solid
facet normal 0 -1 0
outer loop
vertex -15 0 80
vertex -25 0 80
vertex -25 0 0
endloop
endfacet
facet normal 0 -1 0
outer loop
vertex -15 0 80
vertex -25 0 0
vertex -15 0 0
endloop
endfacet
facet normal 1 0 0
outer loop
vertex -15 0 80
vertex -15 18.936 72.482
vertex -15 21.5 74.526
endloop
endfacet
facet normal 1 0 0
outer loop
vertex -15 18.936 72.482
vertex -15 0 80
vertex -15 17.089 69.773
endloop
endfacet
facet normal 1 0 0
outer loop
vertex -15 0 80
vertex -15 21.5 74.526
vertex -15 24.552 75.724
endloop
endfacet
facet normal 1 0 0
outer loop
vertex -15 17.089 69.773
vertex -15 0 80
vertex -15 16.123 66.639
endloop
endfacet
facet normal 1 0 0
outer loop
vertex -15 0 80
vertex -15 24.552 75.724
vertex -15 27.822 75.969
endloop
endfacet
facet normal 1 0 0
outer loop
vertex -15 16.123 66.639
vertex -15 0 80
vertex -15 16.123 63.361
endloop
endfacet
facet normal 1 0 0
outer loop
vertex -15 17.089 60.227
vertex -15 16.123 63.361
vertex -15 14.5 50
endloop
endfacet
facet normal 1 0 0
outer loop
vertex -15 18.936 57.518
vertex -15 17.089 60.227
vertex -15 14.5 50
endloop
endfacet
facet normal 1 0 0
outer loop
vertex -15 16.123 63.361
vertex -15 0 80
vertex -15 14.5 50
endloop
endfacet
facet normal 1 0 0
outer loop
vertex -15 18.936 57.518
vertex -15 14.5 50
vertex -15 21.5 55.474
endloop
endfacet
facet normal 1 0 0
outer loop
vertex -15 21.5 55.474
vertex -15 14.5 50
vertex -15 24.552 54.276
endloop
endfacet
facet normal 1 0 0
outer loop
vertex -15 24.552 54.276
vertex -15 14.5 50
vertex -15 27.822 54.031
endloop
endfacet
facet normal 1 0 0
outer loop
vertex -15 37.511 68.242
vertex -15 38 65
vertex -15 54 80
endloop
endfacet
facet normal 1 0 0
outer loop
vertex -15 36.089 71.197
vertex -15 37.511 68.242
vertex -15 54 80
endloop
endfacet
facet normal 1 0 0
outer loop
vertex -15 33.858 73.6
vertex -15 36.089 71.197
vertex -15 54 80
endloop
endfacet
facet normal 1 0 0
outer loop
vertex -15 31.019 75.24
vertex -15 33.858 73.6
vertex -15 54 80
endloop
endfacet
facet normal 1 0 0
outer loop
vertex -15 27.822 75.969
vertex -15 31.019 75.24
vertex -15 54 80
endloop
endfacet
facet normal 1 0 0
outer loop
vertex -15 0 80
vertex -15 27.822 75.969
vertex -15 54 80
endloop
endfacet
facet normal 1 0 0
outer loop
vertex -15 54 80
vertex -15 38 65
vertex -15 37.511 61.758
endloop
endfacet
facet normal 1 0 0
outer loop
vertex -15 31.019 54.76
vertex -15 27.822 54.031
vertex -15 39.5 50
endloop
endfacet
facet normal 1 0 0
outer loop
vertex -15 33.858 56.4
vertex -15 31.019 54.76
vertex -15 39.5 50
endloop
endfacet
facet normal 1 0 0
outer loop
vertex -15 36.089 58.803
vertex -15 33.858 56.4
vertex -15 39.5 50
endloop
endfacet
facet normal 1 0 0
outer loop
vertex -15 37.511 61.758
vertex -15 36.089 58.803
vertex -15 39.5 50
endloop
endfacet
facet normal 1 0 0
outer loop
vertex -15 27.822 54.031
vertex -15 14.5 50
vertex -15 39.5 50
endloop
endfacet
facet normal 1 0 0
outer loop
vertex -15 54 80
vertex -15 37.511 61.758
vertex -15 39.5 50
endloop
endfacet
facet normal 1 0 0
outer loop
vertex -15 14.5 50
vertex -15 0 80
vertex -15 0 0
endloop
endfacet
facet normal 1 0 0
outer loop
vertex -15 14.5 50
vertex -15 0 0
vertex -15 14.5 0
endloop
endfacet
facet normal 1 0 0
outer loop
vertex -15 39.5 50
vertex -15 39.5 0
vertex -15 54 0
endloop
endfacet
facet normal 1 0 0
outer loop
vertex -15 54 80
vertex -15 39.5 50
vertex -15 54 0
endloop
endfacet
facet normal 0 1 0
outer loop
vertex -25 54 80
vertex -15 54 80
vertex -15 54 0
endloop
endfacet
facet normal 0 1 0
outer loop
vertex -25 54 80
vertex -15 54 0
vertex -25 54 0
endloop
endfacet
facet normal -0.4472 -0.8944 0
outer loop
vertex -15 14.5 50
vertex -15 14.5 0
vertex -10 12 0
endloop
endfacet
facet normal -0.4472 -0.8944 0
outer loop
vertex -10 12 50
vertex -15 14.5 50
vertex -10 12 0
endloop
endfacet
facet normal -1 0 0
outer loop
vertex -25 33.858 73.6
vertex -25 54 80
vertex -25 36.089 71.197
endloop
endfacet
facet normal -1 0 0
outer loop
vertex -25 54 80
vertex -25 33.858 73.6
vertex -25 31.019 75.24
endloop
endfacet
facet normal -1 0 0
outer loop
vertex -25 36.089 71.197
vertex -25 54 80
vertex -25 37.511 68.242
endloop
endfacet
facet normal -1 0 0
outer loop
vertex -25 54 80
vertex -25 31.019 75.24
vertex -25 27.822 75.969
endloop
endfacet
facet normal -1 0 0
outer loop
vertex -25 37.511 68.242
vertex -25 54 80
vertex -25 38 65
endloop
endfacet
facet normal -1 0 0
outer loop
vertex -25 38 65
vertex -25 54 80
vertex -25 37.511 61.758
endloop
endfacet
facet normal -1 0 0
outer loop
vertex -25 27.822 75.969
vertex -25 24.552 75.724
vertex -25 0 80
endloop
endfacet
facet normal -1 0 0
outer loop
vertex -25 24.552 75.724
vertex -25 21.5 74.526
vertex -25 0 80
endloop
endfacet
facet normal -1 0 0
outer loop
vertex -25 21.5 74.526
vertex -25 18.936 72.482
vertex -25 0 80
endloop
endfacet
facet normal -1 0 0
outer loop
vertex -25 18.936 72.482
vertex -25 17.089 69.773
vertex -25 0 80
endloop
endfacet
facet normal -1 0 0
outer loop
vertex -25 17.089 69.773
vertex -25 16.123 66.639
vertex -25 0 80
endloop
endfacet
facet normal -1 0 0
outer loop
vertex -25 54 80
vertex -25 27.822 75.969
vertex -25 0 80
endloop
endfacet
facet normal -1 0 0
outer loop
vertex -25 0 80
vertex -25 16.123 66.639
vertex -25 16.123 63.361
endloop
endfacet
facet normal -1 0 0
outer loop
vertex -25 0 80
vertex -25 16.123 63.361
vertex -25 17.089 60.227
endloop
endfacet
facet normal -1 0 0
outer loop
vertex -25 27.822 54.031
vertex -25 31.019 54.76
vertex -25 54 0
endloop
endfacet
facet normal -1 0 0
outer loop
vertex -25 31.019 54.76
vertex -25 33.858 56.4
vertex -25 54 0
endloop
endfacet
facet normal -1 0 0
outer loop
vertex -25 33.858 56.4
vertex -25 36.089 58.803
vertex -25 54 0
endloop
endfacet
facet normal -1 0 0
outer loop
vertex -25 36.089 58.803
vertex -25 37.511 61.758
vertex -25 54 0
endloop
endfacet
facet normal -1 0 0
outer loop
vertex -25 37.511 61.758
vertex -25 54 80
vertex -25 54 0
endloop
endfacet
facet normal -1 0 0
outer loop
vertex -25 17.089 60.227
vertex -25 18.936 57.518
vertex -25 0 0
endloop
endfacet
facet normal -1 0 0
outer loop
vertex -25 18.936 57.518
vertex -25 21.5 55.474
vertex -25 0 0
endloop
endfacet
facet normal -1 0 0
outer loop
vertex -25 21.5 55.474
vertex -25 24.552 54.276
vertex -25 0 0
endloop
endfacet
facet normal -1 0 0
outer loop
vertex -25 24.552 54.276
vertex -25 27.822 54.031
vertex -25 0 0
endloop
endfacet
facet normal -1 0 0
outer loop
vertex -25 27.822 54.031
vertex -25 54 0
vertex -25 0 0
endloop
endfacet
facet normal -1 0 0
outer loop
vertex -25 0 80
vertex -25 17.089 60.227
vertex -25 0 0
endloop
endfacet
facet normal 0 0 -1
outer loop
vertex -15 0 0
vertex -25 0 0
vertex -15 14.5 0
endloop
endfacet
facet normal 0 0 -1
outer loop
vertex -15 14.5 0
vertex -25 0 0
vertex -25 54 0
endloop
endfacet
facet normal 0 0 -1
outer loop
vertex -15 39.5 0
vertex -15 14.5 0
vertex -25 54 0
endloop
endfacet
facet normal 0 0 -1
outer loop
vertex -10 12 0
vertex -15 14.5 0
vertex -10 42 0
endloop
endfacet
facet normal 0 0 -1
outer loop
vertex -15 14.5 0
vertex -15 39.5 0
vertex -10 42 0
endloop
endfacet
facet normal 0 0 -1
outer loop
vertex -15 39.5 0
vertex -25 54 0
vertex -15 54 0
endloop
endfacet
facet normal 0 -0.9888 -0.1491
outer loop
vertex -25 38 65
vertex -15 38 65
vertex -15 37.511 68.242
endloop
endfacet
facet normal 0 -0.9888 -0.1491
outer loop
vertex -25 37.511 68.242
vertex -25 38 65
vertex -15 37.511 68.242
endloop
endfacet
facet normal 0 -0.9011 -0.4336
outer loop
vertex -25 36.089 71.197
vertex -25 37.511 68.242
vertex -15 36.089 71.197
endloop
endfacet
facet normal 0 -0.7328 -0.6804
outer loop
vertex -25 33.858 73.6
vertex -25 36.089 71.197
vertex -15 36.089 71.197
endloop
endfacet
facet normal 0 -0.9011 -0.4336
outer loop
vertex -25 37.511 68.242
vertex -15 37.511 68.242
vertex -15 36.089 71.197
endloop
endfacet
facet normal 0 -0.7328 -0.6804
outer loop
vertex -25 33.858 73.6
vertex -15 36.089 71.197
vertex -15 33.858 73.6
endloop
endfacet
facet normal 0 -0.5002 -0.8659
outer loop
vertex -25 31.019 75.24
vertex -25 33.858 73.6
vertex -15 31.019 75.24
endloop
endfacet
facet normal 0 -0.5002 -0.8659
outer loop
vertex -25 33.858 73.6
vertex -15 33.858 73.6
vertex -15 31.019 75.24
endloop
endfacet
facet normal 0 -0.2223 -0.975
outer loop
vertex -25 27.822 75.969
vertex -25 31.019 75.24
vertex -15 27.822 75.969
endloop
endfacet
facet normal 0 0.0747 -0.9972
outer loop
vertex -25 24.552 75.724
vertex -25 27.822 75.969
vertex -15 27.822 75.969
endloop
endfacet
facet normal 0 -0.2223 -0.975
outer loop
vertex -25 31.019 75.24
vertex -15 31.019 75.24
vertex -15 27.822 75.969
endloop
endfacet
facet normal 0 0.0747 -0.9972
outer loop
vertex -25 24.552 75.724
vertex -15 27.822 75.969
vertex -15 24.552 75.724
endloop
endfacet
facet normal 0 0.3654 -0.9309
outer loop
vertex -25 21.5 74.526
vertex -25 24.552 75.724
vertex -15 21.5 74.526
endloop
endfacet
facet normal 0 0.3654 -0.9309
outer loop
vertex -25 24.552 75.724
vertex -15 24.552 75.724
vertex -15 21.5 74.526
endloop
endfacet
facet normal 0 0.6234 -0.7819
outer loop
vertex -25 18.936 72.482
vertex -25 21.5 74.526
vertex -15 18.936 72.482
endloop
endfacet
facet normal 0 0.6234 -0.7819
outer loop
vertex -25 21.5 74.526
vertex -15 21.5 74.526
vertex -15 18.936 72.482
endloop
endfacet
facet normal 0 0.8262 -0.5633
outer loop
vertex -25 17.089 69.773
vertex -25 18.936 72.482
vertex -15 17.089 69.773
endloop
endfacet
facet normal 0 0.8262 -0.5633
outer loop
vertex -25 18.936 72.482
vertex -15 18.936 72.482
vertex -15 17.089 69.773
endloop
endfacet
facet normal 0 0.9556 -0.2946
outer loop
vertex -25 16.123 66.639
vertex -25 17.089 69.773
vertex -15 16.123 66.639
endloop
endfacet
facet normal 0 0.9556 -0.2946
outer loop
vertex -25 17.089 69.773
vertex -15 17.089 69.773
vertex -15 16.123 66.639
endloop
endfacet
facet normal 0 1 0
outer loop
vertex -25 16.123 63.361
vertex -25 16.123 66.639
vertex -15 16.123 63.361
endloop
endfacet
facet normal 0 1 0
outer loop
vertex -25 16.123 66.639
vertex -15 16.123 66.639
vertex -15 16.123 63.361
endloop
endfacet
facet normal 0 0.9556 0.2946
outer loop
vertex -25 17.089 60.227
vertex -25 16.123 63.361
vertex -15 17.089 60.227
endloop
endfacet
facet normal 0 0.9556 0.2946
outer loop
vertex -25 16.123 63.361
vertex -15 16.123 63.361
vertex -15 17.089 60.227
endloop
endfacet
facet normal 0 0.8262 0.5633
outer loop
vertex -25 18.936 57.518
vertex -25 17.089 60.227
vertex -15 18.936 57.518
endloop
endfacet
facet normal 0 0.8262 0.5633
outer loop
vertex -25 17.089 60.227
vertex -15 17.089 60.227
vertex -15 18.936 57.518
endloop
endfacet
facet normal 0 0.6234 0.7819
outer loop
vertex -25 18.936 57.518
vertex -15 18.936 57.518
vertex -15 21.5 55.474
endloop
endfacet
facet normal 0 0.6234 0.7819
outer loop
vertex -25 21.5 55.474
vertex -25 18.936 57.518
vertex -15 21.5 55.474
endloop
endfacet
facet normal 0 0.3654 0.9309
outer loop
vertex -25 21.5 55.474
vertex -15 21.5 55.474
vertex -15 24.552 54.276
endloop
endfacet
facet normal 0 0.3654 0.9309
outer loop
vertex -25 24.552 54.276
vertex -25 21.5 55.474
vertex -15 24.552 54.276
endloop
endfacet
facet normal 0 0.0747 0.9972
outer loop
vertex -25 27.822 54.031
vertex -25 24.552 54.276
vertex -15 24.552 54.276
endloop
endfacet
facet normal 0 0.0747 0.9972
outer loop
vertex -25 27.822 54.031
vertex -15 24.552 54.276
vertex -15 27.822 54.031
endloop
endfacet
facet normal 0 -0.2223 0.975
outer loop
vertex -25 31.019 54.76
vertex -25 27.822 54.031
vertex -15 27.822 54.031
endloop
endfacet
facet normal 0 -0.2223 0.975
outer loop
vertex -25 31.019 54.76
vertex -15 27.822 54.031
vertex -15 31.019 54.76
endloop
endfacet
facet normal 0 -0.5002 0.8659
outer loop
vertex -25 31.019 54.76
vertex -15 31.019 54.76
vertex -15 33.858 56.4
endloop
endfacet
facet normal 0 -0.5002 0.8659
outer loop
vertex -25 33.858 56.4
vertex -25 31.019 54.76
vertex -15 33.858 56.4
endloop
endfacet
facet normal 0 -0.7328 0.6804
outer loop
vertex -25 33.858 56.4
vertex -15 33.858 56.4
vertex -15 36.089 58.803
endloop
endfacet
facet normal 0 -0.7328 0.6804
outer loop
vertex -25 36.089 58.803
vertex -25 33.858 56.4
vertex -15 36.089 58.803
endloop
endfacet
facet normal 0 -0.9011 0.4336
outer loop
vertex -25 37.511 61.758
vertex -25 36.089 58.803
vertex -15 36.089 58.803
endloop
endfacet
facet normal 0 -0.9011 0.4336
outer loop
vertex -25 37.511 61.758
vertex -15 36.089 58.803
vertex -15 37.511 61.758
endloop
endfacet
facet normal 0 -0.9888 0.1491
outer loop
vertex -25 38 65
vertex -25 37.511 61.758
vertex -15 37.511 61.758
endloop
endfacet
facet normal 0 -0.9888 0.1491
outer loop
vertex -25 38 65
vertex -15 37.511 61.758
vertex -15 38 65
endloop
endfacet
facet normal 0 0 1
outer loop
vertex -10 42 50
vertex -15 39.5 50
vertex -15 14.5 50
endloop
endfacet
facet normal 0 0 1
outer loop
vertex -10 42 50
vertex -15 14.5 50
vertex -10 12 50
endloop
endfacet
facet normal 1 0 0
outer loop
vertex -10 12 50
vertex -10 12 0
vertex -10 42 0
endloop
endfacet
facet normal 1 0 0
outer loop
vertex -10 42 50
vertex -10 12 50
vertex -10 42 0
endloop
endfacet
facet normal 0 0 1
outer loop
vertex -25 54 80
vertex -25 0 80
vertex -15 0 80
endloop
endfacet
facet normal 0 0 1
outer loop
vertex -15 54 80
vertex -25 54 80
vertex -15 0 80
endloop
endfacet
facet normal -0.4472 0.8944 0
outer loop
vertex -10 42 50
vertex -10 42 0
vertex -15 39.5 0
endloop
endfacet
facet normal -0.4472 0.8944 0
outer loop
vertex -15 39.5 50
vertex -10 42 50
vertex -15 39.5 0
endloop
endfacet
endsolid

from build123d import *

# Parameters (mm, degrees)
PAD_DEPTH    = 50
SKETCH_W     = 10
SKETCH_H     = 54
PAD001_DEPTH = 80
SKETCH002_R  = 11
POCKET_DEPTH = 25.001


with BuildPart() as part:
    # Sketch001 → Pad (new body)
    with BuildSketch(Plane.XY):
        Polygon((-15, 0), (-15, 14.5), (-10, 12), (-10, 42), (-15, 39.5), (-15, 54), (-25, 54), (-25, 0), align=None)
    extrude(amount=PAD_DEPTH)

    # Sketch → Pad001 (join)
    with BuildSketch(Plane.XY):
        with Locations((-20, 27)):
            Rectangle(SKETCH_W, SKETCH_H)
    extrude(amount=PAD001_DEPTH)

    # Sketch002 → Pocket (cut, through all)
    with BuildSketch(Plane.YZ):
        with Locations((27, 65)):
            Circle(SKETCH002_R)
    extrude(amount=-POCKET_DEPTH, mode=Mode.SUBTRACT)


solid = part.part
